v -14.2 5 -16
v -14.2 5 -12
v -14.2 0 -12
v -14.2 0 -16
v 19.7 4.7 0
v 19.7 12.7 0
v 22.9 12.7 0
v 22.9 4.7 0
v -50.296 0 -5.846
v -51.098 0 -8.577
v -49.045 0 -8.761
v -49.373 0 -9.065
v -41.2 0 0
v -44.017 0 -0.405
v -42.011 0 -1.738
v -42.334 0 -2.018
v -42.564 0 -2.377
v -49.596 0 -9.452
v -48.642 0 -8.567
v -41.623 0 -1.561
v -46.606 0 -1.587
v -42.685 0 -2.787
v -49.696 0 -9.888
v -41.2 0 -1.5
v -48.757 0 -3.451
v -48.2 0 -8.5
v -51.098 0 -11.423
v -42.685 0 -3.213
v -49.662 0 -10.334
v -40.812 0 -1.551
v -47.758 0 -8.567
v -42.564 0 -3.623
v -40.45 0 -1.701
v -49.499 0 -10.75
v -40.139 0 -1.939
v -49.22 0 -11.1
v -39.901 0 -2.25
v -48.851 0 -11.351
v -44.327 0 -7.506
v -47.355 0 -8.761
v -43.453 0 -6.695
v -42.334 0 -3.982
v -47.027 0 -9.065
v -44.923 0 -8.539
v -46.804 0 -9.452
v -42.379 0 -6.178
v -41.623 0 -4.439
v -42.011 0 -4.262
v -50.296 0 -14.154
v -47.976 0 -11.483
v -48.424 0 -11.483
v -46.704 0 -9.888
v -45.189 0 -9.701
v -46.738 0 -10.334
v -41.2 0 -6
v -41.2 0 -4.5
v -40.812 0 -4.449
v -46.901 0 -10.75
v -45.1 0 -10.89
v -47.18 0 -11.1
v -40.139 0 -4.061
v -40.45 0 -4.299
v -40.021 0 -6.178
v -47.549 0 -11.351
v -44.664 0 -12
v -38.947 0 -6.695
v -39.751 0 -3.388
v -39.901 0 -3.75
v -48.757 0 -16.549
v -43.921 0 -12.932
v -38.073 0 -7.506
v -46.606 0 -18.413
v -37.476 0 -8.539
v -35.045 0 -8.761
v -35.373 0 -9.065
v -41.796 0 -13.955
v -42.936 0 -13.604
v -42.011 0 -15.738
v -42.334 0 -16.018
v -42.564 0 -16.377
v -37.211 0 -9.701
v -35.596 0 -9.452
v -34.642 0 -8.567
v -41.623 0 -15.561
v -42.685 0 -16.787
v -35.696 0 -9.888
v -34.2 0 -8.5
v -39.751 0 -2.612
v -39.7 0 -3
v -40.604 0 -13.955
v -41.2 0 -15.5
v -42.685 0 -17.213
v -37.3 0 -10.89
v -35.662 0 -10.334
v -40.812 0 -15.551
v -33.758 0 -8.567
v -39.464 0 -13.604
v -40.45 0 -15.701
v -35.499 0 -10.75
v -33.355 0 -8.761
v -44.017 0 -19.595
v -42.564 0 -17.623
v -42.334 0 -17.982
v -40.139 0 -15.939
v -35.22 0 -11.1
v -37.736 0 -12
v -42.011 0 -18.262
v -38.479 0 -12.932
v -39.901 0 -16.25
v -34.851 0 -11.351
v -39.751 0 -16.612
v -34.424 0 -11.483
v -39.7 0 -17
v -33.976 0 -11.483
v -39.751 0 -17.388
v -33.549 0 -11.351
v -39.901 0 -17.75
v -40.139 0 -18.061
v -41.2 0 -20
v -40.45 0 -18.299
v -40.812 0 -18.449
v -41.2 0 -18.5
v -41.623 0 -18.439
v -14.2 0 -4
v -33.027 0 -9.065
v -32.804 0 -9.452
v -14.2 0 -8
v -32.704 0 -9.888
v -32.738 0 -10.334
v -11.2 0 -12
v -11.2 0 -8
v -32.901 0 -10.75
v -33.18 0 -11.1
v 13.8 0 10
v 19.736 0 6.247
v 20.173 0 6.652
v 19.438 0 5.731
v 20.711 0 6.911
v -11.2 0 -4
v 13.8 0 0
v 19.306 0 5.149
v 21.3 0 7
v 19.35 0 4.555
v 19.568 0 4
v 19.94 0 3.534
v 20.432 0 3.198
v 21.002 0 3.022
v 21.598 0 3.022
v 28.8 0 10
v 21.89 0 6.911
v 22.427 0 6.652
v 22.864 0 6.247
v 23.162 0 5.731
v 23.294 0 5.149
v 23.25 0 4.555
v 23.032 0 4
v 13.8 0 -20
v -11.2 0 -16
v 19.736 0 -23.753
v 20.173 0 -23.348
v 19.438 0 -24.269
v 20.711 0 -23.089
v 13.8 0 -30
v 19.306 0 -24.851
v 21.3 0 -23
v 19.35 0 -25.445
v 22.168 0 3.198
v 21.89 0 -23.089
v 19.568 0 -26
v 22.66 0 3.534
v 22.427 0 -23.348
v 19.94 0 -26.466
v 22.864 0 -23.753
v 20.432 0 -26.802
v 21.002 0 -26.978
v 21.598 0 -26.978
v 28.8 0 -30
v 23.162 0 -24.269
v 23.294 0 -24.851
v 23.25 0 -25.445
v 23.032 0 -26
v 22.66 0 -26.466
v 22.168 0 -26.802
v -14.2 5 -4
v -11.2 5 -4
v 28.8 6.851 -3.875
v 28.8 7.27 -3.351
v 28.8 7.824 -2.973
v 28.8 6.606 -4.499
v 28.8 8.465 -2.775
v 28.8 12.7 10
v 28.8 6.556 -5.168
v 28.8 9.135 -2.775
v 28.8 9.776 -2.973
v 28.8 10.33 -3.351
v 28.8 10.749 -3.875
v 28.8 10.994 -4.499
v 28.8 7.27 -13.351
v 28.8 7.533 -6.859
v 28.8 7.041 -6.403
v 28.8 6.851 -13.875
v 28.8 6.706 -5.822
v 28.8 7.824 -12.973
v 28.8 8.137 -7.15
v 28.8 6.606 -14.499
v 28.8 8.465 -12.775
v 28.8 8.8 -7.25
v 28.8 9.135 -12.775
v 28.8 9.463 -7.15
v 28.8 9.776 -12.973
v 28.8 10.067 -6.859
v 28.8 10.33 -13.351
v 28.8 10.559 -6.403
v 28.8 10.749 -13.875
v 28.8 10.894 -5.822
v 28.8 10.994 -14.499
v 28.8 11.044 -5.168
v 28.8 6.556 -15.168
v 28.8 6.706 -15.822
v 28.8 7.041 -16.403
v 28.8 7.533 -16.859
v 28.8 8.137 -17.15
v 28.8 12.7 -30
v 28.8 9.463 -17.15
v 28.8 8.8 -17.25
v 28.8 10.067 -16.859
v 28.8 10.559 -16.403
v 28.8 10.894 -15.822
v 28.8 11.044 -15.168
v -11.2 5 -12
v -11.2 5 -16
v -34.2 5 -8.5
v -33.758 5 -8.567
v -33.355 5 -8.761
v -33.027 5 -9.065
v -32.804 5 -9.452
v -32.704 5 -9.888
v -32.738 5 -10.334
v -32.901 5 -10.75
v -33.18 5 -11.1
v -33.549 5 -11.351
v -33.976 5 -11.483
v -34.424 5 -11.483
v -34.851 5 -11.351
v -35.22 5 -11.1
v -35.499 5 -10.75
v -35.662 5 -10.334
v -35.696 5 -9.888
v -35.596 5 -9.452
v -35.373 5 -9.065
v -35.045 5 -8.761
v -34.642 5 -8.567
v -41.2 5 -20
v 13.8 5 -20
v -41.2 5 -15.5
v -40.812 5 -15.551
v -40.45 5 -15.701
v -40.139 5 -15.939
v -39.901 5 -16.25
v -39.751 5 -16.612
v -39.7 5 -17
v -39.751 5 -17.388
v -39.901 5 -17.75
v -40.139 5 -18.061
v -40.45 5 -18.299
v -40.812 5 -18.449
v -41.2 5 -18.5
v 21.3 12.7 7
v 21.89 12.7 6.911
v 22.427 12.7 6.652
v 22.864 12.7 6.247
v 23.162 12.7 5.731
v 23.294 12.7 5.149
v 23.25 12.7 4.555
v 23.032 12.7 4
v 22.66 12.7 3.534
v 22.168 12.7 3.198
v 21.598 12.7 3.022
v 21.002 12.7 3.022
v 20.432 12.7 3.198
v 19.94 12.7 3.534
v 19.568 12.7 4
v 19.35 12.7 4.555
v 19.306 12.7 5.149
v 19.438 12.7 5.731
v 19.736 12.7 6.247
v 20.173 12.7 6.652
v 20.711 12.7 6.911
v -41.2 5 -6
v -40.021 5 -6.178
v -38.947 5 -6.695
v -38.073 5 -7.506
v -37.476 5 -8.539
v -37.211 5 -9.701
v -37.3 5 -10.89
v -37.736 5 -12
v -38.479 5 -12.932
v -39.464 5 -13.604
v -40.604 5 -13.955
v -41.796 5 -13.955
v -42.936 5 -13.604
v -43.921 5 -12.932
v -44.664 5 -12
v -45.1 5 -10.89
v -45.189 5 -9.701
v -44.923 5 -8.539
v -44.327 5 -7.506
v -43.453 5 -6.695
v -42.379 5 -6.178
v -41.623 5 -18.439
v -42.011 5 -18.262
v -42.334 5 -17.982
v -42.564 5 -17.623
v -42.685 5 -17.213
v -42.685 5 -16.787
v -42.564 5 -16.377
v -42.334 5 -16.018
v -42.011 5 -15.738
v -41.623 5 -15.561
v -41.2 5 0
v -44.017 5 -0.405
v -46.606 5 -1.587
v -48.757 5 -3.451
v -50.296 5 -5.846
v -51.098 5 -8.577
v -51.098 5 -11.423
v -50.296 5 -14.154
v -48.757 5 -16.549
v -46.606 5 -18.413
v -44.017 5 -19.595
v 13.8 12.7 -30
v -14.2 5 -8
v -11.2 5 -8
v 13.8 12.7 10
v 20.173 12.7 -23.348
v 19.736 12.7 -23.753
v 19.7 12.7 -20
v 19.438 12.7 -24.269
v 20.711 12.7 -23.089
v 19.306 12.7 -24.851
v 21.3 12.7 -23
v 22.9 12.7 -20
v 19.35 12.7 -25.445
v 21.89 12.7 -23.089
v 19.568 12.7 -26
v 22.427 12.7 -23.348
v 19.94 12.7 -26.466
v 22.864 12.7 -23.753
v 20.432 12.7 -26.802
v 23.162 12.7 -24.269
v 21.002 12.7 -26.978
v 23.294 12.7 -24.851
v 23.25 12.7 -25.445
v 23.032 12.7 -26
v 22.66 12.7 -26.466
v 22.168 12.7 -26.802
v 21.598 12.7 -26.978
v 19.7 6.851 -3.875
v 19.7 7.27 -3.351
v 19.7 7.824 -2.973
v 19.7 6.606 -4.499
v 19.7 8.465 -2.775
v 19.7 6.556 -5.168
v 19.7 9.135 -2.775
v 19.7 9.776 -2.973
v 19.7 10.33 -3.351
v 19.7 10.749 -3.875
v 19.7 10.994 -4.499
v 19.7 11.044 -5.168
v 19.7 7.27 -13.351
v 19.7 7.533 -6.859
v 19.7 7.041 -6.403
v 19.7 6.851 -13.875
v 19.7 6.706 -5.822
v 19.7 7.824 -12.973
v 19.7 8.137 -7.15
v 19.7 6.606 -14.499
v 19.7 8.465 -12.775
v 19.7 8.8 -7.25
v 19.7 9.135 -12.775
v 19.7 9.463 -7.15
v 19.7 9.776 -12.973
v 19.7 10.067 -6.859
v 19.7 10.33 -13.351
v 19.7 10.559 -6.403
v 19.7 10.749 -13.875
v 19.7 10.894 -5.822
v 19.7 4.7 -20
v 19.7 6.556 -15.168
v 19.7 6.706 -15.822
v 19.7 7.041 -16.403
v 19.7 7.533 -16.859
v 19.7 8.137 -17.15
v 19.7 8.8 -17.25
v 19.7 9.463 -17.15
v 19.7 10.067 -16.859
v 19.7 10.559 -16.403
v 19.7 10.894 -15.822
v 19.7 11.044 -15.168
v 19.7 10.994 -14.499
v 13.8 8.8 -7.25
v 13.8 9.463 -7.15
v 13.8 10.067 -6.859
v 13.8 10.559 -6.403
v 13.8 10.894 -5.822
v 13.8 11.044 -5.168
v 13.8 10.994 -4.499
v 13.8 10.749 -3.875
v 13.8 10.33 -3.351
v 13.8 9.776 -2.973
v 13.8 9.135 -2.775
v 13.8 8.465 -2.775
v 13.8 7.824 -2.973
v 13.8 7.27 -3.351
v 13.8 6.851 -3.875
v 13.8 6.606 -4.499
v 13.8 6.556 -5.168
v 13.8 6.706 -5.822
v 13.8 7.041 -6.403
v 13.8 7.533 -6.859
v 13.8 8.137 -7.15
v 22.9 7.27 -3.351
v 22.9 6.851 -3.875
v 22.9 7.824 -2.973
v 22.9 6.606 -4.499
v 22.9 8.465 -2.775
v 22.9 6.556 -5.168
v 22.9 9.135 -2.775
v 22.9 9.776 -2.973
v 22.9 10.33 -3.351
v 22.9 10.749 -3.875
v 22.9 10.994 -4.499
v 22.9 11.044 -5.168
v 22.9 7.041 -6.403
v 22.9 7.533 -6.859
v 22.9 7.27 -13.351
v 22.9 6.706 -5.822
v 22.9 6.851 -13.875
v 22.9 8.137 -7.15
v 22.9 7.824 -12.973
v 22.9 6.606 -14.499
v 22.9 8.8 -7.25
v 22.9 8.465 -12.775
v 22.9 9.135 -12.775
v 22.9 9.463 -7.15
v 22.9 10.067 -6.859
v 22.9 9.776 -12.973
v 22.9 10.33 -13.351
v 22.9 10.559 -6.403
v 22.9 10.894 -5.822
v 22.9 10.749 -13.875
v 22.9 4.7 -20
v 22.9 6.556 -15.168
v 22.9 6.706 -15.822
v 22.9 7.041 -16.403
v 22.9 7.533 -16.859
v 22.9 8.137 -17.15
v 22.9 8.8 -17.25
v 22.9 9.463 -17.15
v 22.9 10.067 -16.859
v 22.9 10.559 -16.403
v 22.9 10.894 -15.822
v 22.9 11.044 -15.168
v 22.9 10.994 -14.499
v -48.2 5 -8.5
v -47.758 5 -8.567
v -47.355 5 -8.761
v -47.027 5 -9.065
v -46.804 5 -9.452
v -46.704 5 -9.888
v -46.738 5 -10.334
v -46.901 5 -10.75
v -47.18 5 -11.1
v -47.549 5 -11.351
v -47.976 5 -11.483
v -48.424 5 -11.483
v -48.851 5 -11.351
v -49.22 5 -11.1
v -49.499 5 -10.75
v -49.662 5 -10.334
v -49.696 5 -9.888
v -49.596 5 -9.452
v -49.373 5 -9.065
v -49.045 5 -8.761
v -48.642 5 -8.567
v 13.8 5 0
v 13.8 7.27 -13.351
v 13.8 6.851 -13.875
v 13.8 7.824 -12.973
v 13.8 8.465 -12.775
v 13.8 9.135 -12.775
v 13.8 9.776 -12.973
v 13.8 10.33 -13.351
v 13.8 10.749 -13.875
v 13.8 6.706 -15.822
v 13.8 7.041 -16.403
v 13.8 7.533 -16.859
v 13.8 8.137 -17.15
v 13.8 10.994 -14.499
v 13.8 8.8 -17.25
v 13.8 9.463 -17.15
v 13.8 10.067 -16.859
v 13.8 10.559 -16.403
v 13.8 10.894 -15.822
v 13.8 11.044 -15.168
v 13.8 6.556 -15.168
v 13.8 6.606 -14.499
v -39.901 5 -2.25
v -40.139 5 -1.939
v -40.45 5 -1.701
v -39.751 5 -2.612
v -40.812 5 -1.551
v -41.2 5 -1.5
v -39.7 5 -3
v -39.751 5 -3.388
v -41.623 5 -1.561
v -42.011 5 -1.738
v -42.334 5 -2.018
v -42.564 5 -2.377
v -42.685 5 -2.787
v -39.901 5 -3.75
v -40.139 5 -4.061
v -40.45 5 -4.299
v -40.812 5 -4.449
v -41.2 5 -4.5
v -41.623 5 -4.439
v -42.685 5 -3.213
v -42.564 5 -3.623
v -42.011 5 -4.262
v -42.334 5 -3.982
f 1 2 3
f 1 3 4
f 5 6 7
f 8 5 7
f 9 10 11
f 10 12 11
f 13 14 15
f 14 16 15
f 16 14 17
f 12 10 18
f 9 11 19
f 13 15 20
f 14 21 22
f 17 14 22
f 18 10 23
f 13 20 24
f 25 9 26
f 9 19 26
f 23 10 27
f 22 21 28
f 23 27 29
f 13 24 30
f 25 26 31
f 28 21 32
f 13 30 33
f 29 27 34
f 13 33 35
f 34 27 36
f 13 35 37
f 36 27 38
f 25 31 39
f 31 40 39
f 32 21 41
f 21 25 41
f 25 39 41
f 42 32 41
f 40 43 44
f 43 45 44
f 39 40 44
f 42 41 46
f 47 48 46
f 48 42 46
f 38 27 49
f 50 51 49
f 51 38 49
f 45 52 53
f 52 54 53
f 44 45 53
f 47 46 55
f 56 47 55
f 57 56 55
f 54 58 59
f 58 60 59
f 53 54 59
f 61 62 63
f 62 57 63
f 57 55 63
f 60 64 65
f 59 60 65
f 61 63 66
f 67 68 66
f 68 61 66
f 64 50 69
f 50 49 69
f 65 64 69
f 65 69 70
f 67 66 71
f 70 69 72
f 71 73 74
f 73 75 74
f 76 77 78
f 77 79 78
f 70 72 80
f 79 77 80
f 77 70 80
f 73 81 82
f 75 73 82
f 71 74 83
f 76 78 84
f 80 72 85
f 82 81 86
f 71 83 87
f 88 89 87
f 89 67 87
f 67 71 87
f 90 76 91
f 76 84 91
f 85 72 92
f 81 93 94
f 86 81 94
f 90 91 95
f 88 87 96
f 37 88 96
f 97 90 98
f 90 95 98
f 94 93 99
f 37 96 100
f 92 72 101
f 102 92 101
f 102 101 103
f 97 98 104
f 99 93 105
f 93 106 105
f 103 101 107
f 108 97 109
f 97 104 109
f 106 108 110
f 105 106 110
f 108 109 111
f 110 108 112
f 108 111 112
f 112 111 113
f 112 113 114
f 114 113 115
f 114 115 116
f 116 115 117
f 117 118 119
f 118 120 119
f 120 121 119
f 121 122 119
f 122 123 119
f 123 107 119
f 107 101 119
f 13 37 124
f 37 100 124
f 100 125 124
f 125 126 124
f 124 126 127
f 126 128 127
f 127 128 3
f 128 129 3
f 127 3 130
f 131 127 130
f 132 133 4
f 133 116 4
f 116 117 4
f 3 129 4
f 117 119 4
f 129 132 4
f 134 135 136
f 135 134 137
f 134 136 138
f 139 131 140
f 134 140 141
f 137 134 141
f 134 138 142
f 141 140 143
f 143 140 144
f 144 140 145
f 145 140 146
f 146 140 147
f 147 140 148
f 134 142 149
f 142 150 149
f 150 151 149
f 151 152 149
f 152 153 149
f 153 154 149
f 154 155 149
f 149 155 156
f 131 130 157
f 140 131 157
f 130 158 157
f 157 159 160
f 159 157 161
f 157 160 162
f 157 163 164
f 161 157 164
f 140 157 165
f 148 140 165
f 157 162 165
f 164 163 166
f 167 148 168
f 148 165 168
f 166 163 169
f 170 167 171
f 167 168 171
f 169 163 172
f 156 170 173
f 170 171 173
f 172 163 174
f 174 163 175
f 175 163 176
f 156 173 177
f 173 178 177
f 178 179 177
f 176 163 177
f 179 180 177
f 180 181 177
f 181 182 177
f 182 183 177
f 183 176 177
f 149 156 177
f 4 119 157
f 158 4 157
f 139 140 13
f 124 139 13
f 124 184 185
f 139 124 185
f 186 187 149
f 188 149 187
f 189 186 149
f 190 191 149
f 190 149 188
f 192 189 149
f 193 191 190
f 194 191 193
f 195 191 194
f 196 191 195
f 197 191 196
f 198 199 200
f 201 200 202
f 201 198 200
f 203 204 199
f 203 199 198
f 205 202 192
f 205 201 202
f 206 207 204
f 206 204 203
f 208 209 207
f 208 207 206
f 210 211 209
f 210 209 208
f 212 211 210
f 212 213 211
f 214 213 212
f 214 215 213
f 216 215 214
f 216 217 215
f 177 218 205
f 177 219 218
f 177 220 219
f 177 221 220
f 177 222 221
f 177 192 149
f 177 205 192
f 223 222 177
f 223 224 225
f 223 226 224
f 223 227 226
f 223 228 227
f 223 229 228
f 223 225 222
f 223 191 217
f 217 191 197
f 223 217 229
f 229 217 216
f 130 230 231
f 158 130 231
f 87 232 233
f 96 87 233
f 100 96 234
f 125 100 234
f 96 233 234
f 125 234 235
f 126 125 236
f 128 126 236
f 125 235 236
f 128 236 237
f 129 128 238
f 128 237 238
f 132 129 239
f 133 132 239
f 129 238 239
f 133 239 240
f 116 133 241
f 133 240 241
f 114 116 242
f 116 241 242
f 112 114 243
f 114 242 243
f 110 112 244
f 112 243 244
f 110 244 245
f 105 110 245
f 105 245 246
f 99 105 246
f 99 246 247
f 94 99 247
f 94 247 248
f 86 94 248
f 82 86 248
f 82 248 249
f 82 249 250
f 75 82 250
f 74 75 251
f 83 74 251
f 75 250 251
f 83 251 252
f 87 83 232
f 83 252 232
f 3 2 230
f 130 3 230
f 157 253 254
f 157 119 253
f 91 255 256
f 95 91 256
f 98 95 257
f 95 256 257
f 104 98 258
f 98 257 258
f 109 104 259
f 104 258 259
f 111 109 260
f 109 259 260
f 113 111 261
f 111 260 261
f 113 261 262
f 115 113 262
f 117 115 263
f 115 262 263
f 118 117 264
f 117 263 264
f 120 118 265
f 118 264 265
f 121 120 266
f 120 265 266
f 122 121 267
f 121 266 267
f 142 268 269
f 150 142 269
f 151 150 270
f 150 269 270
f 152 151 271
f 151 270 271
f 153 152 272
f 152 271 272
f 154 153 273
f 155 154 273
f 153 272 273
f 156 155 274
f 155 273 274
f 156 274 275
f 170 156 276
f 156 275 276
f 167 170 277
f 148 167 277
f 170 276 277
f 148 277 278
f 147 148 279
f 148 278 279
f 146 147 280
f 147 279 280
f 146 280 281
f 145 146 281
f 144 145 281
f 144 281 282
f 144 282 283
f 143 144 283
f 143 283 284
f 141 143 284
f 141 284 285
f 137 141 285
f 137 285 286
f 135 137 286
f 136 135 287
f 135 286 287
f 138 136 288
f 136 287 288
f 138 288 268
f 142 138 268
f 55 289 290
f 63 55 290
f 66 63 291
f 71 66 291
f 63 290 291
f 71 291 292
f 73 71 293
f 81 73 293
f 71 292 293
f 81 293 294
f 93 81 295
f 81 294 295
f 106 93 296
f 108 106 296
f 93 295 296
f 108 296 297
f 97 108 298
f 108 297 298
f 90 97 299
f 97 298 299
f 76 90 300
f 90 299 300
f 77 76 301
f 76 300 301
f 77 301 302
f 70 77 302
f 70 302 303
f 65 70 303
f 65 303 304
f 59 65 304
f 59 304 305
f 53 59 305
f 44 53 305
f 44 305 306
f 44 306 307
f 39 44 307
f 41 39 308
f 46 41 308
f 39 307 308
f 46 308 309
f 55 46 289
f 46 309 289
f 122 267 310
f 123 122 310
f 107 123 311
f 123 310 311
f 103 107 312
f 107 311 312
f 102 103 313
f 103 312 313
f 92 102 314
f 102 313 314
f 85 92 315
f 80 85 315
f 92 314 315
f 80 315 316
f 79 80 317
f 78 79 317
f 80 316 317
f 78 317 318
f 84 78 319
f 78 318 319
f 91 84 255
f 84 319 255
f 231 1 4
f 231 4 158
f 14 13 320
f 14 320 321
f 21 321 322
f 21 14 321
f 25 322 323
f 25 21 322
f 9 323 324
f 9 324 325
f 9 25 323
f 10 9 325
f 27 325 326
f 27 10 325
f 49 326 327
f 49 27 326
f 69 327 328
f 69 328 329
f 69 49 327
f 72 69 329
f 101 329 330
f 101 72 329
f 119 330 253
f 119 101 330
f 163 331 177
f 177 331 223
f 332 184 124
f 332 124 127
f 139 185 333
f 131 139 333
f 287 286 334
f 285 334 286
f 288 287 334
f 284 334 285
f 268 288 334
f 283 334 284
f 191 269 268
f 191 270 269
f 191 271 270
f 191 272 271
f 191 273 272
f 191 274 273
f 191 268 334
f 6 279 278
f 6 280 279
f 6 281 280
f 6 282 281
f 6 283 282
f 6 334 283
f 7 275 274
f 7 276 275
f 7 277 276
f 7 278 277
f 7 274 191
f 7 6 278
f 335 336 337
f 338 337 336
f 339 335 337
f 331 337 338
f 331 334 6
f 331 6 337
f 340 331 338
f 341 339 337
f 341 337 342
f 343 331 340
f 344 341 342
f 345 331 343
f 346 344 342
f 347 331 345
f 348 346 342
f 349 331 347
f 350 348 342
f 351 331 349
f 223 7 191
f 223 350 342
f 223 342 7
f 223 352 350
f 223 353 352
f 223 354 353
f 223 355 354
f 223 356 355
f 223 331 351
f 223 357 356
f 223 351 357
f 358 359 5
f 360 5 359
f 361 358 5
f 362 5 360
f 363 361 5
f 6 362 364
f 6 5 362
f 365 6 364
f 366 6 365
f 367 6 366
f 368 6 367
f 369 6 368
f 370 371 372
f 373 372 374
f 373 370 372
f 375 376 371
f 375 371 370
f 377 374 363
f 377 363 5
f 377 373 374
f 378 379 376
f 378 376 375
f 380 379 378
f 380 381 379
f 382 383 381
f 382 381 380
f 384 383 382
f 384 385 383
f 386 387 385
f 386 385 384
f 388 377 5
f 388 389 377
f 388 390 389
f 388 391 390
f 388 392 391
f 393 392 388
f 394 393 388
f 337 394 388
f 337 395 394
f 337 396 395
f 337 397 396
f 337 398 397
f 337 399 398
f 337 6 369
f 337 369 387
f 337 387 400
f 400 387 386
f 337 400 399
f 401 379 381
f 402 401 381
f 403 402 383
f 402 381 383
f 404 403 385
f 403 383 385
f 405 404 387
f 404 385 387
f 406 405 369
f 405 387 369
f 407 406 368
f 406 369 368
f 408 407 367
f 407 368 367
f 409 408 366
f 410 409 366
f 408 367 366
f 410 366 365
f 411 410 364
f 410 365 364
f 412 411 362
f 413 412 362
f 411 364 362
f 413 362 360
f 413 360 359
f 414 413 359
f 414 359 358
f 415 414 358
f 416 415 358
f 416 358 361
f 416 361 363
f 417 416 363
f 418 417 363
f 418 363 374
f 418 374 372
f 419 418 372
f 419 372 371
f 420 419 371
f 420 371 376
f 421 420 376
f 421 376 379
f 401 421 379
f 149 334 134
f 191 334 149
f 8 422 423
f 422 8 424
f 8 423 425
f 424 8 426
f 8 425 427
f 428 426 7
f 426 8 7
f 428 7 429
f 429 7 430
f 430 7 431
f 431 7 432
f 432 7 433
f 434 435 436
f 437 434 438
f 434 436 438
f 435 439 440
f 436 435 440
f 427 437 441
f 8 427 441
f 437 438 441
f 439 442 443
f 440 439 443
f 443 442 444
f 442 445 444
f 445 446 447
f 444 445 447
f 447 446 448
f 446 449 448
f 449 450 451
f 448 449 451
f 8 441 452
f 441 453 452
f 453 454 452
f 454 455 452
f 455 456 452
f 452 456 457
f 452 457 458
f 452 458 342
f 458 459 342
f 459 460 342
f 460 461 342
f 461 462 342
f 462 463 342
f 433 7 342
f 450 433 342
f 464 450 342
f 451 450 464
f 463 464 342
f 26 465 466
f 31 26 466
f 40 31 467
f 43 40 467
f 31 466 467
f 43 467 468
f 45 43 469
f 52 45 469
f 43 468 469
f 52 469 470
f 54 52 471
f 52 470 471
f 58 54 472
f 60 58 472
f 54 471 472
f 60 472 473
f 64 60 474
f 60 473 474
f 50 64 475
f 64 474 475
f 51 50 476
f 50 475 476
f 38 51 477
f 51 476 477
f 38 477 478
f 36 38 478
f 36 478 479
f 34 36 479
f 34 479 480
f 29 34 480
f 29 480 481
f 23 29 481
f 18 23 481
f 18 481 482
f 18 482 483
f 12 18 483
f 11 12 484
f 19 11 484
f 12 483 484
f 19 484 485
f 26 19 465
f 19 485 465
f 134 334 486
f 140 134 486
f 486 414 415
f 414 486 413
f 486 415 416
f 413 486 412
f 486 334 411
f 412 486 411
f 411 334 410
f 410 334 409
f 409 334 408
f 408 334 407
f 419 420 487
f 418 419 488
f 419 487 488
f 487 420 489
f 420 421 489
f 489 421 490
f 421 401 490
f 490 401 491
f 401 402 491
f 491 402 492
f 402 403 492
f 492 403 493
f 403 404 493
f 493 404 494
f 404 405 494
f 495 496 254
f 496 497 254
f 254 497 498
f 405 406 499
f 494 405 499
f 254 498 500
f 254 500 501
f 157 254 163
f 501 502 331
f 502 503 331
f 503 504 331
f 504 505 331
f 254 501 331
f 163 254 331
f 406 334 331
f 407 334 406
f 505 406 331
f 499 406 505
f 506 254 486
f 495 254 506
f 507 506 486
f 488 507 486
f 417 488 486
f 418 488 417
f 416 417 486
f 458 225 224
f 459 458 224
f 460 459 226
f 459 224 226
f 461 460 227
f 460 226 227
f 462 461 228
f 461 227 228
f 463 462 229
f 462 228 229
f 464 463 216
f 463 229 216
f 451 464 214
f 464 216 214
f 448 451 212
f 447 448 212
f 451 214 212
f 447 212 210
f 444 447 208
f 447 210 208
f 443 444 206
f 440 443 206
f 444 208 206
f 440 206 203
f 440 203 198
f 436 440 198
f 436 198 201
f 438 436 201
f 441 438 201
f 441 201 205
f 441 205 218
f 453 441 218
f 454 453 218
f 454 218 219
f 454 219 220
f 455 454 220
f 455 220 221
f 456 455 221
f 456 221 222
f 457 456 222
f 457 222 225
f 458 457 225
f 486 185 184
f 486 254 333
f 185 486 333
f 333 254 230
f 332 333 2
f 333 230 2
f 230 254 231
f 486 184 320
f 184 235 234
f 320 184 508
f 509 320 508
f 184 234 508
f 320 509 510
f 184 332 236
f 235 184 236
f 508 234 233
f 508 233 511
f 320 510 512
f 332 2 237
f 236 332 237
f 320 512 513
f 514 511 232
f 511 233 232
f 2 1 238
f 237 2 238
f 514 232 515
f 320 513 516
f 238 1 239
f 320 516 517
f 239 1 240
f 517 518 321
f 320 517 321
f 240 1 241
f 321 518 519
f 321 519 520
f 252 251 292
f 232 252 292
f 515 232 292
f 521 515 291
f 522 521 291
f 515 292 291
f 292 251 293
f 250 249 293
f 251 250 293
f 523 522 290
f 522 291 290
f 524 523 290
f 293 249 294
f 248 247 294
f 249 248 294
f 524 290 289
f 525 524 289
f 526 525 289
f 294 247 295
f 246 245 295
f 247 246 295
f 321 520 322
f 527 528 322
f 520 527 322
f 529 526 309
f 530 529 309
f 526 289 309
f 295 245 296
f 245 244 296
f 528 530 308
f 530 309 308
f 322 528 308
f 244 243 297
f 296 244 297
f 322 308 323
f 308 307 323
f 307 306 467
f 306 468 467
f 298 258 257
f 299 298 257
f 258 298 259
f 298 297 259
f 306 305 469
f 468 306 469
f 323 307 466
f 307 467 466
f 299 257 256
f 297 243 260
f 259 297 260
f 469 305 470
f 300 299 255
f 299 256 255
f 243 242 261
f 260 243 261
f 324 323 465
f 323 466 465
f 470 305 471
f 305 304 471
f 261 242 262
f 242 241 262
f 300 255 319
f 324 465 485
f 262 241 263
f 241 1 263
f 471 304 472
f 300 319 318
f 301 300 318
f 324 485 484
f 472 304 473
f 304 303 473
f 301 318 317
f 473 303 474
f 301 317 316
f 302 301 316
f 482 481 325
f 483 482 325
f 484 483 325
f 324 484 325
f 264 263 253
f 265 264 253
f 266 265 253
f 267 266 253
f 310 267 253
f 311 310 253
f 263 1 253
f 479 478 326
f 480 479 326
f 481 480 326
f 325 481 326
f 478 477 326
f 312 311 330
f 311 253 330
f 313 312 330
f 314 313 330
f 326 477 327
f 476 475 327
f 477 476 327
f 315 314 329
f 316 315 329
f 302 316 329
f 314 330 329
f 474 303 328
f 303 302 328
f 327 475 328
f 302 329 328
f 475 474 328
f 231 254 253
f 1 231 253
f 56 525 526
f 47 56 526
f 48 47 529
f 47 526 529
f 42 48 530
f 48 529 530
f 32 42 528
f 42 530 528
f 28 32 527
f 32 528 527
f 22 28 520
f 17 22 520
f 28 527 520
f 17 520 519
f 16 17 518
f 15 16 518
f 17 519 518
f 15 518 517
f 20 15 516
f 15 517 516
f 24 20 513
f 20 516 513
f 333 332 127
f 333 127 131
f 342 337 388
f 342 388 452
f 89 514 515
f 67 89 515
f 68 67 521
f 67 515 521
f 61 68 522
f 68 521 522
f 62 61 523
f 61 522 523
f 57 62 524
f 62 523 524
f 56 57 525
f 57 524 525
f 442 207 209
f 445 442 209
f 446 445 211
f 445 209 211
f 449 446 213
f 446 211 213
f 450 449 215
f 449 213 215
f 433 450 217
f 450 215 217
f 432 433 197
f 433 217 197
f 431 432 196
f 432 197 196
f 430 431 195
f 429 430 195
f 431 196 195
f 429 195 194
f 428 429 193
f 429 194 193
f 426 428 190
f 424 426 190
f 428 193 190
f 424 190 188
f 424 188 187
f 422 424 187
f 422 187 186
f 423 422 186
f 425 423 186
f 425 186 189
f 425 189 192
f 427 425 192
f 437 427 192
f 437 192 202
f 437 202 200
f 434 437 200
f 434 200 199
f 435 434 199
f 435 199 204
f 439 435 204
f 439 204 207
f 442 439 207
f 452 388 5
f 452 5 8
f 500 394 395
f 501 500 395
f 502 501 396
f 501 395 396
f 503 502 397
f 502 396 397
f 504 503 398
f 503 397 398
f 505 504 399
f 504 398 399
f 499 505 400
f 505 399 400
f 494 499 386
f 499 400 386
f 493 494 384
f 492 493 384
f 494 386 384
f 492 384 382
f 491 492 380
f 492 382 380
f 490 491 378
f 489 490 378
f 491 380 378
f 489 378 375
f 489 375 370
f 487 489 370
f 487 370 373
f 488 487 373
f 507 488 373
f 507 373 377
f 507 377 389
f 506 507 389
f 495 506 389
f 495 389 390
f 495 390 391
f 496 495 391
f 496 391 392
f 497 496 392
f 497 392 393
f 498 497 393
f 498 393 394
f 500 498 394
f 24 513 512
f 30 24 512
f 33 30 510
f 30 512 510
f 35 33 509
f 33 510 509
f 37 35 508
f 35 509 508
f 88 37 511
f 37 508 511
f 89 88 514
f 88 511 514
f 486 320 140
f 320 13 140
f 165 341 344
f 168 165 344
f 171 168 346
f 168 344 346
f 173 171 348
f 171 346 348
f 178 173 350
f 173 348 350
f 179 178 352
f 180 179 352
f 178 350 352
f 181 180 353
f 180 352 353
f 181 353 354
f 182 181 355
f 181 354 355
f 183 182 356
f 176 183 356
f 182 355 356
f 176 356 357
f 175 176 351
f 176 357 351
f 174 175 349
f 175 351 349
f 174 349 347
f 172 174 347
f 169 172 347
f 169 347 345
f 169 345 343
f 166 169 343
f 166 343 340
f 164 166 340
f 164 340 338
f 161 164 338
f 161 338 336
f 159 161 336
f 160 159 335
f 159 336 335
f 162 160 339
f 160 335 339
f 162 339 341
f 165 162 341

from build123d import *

# Parameters (mm, degrees)
EXTRUDE_1_DEPTH     = 5
SKETCH_2_R          = 1.5
SKETCH_2_R_2        = 4
CUT_EXTRUDE_1_DEPTH = 5
SKETCH_3_W          = 3
SKETCH_3_H          = 4
CUT_EXTRUDE_2_DEPTH = 5
SKETCH_4_R          = 4
SKETCH_4_R_2        = 1.1
SKETCH_4_W          = 3
SKETCH_4_H          = 4
CUT_EXTRUDE_4_DEPTH = 10
SKETCH_5_W          = 50
SKETCH_5_H          = 20
CUT_EXTRUDE_5_DEPTH = 10
SKETCH_6_W          = 15
SKETCH_6_H          = 20
EXTRUDE_2_DEPTH     = 7.7
SKETCH_7_R          = 2.25
CUT_EXTRUDE_6_DEPTH = 20
SKETCH_8_W          = 15
SKETCH_8_H          = 10
SKETCH_8_R          = 2
EXTRUDE_3_DEPTH     = 12.7
SKETCH_9_W          = 3.2
SKETCH_9_H          = 20
CUT_EXTRUDE_7_DEPTH = 8


with BuildPart() as part:
    # 草图1 → 凸台-拉伸1 (new body)
    with BuildSketch(Plane(origin=(0, 0, 0), x_dir=(1, 0, 0), z_dir=(0, 1, 0))):
        with BuildLine():
            Line((-41.199983302, 20), (78.800016698, 20))
            Line((78.800016698, 20), (78.800016698, 0))
            Line((78.800016698, 0), (-41.199983302, 0))
            ThreePointArc((-41.199983302, 0), (-51.199983302, 10), (-41.199983302, 20))
        make_face()
    extrude(amount=EXTRUDE_1_DEPTH)

    # 草图2 → 切除-拉伸1 (cut)
    with BuildSketch(Plane(origin=(0, 5, 0), x_dir=(1, 0, 0), z_dir=(0, 1, 0))):
        with Locations(Location((-48.199983302, 10, 0), (0, 0, 270))):
            Circle(SKETCH_2_R)
        with BuildLine():
            ThreePointArc((-39.699983302, 17), (-40.13932313, 18.060660172), (-41.199983302, 18.5))
            Line((-41.199983302, 18.5), (-41.199983302, 17))
            Line((-41.199983302, 17), (-41.199983302, 15.5))
            ThreePointArc((-41.199983302, 15.5), (-40.13932313, 15.939339828), (-39.699983302, 17))
        make_face()
        with BuildLine():
            Line((-41.199983302, 17), (-41.199983302, 18.5))
            ThreePointArc((-41.199983302, 18.5), (-42.699983302, 17), (-41.199983302, 15.5))
            Line((-41.199983302, 15.5), (-41.199983302, 17))
        make_face()
        with Locations(Location((-34.199983302, 10, 0), (0, 0, 270))):
            Circle(SKETCH_2_R)
        with BuildLine():
            ThreePointArc((-39.699983302, 3), (-40.13932313, 4.060660172), (-41.199983302, 4.5))
            Line((-41.199983302, 4.5), (-41.199983302, 3))
            Line((-41.199983302, 3), (-41.199983302, 1.5))
            ThreePointArc((-41.199983302, 1.5), (-40.13932313, 1.939339828), (-39.699983302, 3))
        make_face()
        with BuildLine():
            Line((-41.199983302, 3), (-41.199983302, 4.5))
            ThreePointArc((-41.199983302, 4.5), (-42.699983302, 3), (-41.199983302, 1.5))
            Line((-41.199983302, 1.5), (-41.199983302, 3))
        make_face()
        with Locations(Location((-41.199983302, 10, 0), (0, 0, 270))):
            Circle(SKETCH_2_R_2)
    extrude(amount=-CUT_EXTRUDE_1_DEPTH, mode=Mode.SUBTRACT)

    # 草图3 → 切除-拉伸2 (cut)
    with BuildSketch(Plane(origin=(0, 5, 0), x_dir=(1, 0, 0), z_dir=(0, 1, 0))):
        with Locations((-12.699983302, 14)):
            Rectangle(SKETCH_3_W, SKETCH_3_H)
        with Locations((-12.699983302, 6)):
            Rectangle(SKETCH_3_W, SKETCH_3_H)
    extrude(amount=-CUT_EXTRUDE_2_DEPTH, mode=Mode.SUBTRACT)

    # 草图4 → 切除-拉伸4 (cut)
    with BuildSketch(Plane(origin=(0, 5, 0), x_dir=(1, 0, 0), z_dir=(0, 1, 0))):
        with Locations(Location((69.300016698, 10, 0), (0, 0, 270))):
            Circle(SKETCH_4_R)
        with Locations(Location((76.7246379, 17.424621202, 0), (0, 0, 270))):
            Circle(SKETCH_4_R_2)
        with Locations(Location((62.300016698, 10, 0), (0, 0, 270))):
            Circle(SKETCH_4_R_2)
        with Locations((50.800016698, 6)):
            Rectangle(SKETCH_4_W, SKETCH_4_H)
        with Locations((50.800016698, 14)):
            Rectangle(SKETCH_4_W, SKETCH_4_H)
        with Locations(Location((76.7246379, 2.575378798, 0), (0, 0, 270))):
            Circle(SKETCH_4_R_2)
        with Locations(Location((61.875395496, 2.575378798, 0), (0, 0, 270))):
            Circle(SKETCH_4_R_2)
        with Locations(Location((61.875395496, 17.424621202, 0), (0, 0, 270))):
            Circle(SKETCH_4_R_2)
        with Locations(Location((69.300016698, 17, 0), (0, 0, 270))):
            Circle(SKETCH_4_R_2)
        with Locations(Location((76.300016698, 10, 0), (0, 0, 270))):
            Circle(SKETCH_4_R_2)
        with Locations(Location((69.300016698, 3, 0), (0, 0, 270))):
            Circle(SKETCH_4_R_2)
    extrude(amount=-CUT_EXTRUDE_4_DEPTH, mode=Mode.SUBTRACT)

    # 草图5 → 切除-拉伸5 (cut)
    with BuildSketch(Plane(origin=(0, 5, 0), x_dir=(1, 0, 0), z_dir=(0, 1, 0))):
        with Locations((53.800016698, 10)):
            Rectangle(SKETCH_5_W, SKETCH_5_H)
    extrude(amount=-CUT_EXTRUDE_5_DEPTH, mode=Mode.SUBTRACT)

    # 草图6 → 凸台-拉伸2 (add)
    with BuildSketch(Plane(origin=(0, 5, 0), x_dir=(1, 0, 0), z_dir=(0, 1, 0))):
        with Locations((21.300016698, 10)):
            Rectangle(SKETCH_6_W, SKETCH_6_H)
    extrude(amount=EXTRUDE_2_DEPTH)

    # 草图7 → 切除-拉伸6 (cut)
    with BuildSketch(Plane(origin=(28.800016698, 0, 0), x_dir=(0, 0, -1), z_dir=(1, 0, 0))):
        with Locations((5, 8.8)):
            Circle(SKETCH_7_R)
        with Locations((15, 8.8)):
            Circle(SKETCH_7_R)
    extrude(amount=-CUT_EXTRUDE_6_DEPTH, mode=Mode.SUBTRACT)

    # 草图8 → 凸台-拉伸3 (add)
    # profile 1 of 2: a face of its own
    with BuildSketch(Plane(origin=(0, 12.7, 0), x_dir=(1, 0, 0), z_dir=(0, 1, 0))):
        with Locations((21.300016698, 25)):
            Rectangle(SKETCH_8_W, SKETCH_8_H)
        with Locations(Location((21.300016698, 25, 0), (0, 0, 270))):
            Circle(SKETCH_8_R, mode=Mode.SUBTRACT)
    # profile 2 of 2: a face of its own
    with BuildSketch(Plane(origin=(0, 12.7, 0), x_dir=(1, 0, 0), z_dir=(0, 1, 0))):
        with Locations((21.300016698, -5)):
            Rectangle(SKETCH_8_W, SKETCH_8_H)
        with Locations(Location((21.300016698, -5, 0), (0, 0, 270))):
            Circle(SKETCH_8_R, mode=Mode.SUBTRACT)
    extrude(amount=-EXTRUDE_3_DEPTH)

    # 草图9 → 切除-拉伸7 (cut)
    with BuildSketch(Plane(origin=(0, 12.7, 0), x_dir=(1, 0, 0), z_dir=(0, 1, 0))):
        with Locations((21.300016698, 10)):
            Rectangle(SKETCH_9_W, SKETCH_9_H)
    extrude(amount=-CUT_EXTRUDE_7_DEPTH, mode=Mode.SUBTRACT)


solid = part.part
